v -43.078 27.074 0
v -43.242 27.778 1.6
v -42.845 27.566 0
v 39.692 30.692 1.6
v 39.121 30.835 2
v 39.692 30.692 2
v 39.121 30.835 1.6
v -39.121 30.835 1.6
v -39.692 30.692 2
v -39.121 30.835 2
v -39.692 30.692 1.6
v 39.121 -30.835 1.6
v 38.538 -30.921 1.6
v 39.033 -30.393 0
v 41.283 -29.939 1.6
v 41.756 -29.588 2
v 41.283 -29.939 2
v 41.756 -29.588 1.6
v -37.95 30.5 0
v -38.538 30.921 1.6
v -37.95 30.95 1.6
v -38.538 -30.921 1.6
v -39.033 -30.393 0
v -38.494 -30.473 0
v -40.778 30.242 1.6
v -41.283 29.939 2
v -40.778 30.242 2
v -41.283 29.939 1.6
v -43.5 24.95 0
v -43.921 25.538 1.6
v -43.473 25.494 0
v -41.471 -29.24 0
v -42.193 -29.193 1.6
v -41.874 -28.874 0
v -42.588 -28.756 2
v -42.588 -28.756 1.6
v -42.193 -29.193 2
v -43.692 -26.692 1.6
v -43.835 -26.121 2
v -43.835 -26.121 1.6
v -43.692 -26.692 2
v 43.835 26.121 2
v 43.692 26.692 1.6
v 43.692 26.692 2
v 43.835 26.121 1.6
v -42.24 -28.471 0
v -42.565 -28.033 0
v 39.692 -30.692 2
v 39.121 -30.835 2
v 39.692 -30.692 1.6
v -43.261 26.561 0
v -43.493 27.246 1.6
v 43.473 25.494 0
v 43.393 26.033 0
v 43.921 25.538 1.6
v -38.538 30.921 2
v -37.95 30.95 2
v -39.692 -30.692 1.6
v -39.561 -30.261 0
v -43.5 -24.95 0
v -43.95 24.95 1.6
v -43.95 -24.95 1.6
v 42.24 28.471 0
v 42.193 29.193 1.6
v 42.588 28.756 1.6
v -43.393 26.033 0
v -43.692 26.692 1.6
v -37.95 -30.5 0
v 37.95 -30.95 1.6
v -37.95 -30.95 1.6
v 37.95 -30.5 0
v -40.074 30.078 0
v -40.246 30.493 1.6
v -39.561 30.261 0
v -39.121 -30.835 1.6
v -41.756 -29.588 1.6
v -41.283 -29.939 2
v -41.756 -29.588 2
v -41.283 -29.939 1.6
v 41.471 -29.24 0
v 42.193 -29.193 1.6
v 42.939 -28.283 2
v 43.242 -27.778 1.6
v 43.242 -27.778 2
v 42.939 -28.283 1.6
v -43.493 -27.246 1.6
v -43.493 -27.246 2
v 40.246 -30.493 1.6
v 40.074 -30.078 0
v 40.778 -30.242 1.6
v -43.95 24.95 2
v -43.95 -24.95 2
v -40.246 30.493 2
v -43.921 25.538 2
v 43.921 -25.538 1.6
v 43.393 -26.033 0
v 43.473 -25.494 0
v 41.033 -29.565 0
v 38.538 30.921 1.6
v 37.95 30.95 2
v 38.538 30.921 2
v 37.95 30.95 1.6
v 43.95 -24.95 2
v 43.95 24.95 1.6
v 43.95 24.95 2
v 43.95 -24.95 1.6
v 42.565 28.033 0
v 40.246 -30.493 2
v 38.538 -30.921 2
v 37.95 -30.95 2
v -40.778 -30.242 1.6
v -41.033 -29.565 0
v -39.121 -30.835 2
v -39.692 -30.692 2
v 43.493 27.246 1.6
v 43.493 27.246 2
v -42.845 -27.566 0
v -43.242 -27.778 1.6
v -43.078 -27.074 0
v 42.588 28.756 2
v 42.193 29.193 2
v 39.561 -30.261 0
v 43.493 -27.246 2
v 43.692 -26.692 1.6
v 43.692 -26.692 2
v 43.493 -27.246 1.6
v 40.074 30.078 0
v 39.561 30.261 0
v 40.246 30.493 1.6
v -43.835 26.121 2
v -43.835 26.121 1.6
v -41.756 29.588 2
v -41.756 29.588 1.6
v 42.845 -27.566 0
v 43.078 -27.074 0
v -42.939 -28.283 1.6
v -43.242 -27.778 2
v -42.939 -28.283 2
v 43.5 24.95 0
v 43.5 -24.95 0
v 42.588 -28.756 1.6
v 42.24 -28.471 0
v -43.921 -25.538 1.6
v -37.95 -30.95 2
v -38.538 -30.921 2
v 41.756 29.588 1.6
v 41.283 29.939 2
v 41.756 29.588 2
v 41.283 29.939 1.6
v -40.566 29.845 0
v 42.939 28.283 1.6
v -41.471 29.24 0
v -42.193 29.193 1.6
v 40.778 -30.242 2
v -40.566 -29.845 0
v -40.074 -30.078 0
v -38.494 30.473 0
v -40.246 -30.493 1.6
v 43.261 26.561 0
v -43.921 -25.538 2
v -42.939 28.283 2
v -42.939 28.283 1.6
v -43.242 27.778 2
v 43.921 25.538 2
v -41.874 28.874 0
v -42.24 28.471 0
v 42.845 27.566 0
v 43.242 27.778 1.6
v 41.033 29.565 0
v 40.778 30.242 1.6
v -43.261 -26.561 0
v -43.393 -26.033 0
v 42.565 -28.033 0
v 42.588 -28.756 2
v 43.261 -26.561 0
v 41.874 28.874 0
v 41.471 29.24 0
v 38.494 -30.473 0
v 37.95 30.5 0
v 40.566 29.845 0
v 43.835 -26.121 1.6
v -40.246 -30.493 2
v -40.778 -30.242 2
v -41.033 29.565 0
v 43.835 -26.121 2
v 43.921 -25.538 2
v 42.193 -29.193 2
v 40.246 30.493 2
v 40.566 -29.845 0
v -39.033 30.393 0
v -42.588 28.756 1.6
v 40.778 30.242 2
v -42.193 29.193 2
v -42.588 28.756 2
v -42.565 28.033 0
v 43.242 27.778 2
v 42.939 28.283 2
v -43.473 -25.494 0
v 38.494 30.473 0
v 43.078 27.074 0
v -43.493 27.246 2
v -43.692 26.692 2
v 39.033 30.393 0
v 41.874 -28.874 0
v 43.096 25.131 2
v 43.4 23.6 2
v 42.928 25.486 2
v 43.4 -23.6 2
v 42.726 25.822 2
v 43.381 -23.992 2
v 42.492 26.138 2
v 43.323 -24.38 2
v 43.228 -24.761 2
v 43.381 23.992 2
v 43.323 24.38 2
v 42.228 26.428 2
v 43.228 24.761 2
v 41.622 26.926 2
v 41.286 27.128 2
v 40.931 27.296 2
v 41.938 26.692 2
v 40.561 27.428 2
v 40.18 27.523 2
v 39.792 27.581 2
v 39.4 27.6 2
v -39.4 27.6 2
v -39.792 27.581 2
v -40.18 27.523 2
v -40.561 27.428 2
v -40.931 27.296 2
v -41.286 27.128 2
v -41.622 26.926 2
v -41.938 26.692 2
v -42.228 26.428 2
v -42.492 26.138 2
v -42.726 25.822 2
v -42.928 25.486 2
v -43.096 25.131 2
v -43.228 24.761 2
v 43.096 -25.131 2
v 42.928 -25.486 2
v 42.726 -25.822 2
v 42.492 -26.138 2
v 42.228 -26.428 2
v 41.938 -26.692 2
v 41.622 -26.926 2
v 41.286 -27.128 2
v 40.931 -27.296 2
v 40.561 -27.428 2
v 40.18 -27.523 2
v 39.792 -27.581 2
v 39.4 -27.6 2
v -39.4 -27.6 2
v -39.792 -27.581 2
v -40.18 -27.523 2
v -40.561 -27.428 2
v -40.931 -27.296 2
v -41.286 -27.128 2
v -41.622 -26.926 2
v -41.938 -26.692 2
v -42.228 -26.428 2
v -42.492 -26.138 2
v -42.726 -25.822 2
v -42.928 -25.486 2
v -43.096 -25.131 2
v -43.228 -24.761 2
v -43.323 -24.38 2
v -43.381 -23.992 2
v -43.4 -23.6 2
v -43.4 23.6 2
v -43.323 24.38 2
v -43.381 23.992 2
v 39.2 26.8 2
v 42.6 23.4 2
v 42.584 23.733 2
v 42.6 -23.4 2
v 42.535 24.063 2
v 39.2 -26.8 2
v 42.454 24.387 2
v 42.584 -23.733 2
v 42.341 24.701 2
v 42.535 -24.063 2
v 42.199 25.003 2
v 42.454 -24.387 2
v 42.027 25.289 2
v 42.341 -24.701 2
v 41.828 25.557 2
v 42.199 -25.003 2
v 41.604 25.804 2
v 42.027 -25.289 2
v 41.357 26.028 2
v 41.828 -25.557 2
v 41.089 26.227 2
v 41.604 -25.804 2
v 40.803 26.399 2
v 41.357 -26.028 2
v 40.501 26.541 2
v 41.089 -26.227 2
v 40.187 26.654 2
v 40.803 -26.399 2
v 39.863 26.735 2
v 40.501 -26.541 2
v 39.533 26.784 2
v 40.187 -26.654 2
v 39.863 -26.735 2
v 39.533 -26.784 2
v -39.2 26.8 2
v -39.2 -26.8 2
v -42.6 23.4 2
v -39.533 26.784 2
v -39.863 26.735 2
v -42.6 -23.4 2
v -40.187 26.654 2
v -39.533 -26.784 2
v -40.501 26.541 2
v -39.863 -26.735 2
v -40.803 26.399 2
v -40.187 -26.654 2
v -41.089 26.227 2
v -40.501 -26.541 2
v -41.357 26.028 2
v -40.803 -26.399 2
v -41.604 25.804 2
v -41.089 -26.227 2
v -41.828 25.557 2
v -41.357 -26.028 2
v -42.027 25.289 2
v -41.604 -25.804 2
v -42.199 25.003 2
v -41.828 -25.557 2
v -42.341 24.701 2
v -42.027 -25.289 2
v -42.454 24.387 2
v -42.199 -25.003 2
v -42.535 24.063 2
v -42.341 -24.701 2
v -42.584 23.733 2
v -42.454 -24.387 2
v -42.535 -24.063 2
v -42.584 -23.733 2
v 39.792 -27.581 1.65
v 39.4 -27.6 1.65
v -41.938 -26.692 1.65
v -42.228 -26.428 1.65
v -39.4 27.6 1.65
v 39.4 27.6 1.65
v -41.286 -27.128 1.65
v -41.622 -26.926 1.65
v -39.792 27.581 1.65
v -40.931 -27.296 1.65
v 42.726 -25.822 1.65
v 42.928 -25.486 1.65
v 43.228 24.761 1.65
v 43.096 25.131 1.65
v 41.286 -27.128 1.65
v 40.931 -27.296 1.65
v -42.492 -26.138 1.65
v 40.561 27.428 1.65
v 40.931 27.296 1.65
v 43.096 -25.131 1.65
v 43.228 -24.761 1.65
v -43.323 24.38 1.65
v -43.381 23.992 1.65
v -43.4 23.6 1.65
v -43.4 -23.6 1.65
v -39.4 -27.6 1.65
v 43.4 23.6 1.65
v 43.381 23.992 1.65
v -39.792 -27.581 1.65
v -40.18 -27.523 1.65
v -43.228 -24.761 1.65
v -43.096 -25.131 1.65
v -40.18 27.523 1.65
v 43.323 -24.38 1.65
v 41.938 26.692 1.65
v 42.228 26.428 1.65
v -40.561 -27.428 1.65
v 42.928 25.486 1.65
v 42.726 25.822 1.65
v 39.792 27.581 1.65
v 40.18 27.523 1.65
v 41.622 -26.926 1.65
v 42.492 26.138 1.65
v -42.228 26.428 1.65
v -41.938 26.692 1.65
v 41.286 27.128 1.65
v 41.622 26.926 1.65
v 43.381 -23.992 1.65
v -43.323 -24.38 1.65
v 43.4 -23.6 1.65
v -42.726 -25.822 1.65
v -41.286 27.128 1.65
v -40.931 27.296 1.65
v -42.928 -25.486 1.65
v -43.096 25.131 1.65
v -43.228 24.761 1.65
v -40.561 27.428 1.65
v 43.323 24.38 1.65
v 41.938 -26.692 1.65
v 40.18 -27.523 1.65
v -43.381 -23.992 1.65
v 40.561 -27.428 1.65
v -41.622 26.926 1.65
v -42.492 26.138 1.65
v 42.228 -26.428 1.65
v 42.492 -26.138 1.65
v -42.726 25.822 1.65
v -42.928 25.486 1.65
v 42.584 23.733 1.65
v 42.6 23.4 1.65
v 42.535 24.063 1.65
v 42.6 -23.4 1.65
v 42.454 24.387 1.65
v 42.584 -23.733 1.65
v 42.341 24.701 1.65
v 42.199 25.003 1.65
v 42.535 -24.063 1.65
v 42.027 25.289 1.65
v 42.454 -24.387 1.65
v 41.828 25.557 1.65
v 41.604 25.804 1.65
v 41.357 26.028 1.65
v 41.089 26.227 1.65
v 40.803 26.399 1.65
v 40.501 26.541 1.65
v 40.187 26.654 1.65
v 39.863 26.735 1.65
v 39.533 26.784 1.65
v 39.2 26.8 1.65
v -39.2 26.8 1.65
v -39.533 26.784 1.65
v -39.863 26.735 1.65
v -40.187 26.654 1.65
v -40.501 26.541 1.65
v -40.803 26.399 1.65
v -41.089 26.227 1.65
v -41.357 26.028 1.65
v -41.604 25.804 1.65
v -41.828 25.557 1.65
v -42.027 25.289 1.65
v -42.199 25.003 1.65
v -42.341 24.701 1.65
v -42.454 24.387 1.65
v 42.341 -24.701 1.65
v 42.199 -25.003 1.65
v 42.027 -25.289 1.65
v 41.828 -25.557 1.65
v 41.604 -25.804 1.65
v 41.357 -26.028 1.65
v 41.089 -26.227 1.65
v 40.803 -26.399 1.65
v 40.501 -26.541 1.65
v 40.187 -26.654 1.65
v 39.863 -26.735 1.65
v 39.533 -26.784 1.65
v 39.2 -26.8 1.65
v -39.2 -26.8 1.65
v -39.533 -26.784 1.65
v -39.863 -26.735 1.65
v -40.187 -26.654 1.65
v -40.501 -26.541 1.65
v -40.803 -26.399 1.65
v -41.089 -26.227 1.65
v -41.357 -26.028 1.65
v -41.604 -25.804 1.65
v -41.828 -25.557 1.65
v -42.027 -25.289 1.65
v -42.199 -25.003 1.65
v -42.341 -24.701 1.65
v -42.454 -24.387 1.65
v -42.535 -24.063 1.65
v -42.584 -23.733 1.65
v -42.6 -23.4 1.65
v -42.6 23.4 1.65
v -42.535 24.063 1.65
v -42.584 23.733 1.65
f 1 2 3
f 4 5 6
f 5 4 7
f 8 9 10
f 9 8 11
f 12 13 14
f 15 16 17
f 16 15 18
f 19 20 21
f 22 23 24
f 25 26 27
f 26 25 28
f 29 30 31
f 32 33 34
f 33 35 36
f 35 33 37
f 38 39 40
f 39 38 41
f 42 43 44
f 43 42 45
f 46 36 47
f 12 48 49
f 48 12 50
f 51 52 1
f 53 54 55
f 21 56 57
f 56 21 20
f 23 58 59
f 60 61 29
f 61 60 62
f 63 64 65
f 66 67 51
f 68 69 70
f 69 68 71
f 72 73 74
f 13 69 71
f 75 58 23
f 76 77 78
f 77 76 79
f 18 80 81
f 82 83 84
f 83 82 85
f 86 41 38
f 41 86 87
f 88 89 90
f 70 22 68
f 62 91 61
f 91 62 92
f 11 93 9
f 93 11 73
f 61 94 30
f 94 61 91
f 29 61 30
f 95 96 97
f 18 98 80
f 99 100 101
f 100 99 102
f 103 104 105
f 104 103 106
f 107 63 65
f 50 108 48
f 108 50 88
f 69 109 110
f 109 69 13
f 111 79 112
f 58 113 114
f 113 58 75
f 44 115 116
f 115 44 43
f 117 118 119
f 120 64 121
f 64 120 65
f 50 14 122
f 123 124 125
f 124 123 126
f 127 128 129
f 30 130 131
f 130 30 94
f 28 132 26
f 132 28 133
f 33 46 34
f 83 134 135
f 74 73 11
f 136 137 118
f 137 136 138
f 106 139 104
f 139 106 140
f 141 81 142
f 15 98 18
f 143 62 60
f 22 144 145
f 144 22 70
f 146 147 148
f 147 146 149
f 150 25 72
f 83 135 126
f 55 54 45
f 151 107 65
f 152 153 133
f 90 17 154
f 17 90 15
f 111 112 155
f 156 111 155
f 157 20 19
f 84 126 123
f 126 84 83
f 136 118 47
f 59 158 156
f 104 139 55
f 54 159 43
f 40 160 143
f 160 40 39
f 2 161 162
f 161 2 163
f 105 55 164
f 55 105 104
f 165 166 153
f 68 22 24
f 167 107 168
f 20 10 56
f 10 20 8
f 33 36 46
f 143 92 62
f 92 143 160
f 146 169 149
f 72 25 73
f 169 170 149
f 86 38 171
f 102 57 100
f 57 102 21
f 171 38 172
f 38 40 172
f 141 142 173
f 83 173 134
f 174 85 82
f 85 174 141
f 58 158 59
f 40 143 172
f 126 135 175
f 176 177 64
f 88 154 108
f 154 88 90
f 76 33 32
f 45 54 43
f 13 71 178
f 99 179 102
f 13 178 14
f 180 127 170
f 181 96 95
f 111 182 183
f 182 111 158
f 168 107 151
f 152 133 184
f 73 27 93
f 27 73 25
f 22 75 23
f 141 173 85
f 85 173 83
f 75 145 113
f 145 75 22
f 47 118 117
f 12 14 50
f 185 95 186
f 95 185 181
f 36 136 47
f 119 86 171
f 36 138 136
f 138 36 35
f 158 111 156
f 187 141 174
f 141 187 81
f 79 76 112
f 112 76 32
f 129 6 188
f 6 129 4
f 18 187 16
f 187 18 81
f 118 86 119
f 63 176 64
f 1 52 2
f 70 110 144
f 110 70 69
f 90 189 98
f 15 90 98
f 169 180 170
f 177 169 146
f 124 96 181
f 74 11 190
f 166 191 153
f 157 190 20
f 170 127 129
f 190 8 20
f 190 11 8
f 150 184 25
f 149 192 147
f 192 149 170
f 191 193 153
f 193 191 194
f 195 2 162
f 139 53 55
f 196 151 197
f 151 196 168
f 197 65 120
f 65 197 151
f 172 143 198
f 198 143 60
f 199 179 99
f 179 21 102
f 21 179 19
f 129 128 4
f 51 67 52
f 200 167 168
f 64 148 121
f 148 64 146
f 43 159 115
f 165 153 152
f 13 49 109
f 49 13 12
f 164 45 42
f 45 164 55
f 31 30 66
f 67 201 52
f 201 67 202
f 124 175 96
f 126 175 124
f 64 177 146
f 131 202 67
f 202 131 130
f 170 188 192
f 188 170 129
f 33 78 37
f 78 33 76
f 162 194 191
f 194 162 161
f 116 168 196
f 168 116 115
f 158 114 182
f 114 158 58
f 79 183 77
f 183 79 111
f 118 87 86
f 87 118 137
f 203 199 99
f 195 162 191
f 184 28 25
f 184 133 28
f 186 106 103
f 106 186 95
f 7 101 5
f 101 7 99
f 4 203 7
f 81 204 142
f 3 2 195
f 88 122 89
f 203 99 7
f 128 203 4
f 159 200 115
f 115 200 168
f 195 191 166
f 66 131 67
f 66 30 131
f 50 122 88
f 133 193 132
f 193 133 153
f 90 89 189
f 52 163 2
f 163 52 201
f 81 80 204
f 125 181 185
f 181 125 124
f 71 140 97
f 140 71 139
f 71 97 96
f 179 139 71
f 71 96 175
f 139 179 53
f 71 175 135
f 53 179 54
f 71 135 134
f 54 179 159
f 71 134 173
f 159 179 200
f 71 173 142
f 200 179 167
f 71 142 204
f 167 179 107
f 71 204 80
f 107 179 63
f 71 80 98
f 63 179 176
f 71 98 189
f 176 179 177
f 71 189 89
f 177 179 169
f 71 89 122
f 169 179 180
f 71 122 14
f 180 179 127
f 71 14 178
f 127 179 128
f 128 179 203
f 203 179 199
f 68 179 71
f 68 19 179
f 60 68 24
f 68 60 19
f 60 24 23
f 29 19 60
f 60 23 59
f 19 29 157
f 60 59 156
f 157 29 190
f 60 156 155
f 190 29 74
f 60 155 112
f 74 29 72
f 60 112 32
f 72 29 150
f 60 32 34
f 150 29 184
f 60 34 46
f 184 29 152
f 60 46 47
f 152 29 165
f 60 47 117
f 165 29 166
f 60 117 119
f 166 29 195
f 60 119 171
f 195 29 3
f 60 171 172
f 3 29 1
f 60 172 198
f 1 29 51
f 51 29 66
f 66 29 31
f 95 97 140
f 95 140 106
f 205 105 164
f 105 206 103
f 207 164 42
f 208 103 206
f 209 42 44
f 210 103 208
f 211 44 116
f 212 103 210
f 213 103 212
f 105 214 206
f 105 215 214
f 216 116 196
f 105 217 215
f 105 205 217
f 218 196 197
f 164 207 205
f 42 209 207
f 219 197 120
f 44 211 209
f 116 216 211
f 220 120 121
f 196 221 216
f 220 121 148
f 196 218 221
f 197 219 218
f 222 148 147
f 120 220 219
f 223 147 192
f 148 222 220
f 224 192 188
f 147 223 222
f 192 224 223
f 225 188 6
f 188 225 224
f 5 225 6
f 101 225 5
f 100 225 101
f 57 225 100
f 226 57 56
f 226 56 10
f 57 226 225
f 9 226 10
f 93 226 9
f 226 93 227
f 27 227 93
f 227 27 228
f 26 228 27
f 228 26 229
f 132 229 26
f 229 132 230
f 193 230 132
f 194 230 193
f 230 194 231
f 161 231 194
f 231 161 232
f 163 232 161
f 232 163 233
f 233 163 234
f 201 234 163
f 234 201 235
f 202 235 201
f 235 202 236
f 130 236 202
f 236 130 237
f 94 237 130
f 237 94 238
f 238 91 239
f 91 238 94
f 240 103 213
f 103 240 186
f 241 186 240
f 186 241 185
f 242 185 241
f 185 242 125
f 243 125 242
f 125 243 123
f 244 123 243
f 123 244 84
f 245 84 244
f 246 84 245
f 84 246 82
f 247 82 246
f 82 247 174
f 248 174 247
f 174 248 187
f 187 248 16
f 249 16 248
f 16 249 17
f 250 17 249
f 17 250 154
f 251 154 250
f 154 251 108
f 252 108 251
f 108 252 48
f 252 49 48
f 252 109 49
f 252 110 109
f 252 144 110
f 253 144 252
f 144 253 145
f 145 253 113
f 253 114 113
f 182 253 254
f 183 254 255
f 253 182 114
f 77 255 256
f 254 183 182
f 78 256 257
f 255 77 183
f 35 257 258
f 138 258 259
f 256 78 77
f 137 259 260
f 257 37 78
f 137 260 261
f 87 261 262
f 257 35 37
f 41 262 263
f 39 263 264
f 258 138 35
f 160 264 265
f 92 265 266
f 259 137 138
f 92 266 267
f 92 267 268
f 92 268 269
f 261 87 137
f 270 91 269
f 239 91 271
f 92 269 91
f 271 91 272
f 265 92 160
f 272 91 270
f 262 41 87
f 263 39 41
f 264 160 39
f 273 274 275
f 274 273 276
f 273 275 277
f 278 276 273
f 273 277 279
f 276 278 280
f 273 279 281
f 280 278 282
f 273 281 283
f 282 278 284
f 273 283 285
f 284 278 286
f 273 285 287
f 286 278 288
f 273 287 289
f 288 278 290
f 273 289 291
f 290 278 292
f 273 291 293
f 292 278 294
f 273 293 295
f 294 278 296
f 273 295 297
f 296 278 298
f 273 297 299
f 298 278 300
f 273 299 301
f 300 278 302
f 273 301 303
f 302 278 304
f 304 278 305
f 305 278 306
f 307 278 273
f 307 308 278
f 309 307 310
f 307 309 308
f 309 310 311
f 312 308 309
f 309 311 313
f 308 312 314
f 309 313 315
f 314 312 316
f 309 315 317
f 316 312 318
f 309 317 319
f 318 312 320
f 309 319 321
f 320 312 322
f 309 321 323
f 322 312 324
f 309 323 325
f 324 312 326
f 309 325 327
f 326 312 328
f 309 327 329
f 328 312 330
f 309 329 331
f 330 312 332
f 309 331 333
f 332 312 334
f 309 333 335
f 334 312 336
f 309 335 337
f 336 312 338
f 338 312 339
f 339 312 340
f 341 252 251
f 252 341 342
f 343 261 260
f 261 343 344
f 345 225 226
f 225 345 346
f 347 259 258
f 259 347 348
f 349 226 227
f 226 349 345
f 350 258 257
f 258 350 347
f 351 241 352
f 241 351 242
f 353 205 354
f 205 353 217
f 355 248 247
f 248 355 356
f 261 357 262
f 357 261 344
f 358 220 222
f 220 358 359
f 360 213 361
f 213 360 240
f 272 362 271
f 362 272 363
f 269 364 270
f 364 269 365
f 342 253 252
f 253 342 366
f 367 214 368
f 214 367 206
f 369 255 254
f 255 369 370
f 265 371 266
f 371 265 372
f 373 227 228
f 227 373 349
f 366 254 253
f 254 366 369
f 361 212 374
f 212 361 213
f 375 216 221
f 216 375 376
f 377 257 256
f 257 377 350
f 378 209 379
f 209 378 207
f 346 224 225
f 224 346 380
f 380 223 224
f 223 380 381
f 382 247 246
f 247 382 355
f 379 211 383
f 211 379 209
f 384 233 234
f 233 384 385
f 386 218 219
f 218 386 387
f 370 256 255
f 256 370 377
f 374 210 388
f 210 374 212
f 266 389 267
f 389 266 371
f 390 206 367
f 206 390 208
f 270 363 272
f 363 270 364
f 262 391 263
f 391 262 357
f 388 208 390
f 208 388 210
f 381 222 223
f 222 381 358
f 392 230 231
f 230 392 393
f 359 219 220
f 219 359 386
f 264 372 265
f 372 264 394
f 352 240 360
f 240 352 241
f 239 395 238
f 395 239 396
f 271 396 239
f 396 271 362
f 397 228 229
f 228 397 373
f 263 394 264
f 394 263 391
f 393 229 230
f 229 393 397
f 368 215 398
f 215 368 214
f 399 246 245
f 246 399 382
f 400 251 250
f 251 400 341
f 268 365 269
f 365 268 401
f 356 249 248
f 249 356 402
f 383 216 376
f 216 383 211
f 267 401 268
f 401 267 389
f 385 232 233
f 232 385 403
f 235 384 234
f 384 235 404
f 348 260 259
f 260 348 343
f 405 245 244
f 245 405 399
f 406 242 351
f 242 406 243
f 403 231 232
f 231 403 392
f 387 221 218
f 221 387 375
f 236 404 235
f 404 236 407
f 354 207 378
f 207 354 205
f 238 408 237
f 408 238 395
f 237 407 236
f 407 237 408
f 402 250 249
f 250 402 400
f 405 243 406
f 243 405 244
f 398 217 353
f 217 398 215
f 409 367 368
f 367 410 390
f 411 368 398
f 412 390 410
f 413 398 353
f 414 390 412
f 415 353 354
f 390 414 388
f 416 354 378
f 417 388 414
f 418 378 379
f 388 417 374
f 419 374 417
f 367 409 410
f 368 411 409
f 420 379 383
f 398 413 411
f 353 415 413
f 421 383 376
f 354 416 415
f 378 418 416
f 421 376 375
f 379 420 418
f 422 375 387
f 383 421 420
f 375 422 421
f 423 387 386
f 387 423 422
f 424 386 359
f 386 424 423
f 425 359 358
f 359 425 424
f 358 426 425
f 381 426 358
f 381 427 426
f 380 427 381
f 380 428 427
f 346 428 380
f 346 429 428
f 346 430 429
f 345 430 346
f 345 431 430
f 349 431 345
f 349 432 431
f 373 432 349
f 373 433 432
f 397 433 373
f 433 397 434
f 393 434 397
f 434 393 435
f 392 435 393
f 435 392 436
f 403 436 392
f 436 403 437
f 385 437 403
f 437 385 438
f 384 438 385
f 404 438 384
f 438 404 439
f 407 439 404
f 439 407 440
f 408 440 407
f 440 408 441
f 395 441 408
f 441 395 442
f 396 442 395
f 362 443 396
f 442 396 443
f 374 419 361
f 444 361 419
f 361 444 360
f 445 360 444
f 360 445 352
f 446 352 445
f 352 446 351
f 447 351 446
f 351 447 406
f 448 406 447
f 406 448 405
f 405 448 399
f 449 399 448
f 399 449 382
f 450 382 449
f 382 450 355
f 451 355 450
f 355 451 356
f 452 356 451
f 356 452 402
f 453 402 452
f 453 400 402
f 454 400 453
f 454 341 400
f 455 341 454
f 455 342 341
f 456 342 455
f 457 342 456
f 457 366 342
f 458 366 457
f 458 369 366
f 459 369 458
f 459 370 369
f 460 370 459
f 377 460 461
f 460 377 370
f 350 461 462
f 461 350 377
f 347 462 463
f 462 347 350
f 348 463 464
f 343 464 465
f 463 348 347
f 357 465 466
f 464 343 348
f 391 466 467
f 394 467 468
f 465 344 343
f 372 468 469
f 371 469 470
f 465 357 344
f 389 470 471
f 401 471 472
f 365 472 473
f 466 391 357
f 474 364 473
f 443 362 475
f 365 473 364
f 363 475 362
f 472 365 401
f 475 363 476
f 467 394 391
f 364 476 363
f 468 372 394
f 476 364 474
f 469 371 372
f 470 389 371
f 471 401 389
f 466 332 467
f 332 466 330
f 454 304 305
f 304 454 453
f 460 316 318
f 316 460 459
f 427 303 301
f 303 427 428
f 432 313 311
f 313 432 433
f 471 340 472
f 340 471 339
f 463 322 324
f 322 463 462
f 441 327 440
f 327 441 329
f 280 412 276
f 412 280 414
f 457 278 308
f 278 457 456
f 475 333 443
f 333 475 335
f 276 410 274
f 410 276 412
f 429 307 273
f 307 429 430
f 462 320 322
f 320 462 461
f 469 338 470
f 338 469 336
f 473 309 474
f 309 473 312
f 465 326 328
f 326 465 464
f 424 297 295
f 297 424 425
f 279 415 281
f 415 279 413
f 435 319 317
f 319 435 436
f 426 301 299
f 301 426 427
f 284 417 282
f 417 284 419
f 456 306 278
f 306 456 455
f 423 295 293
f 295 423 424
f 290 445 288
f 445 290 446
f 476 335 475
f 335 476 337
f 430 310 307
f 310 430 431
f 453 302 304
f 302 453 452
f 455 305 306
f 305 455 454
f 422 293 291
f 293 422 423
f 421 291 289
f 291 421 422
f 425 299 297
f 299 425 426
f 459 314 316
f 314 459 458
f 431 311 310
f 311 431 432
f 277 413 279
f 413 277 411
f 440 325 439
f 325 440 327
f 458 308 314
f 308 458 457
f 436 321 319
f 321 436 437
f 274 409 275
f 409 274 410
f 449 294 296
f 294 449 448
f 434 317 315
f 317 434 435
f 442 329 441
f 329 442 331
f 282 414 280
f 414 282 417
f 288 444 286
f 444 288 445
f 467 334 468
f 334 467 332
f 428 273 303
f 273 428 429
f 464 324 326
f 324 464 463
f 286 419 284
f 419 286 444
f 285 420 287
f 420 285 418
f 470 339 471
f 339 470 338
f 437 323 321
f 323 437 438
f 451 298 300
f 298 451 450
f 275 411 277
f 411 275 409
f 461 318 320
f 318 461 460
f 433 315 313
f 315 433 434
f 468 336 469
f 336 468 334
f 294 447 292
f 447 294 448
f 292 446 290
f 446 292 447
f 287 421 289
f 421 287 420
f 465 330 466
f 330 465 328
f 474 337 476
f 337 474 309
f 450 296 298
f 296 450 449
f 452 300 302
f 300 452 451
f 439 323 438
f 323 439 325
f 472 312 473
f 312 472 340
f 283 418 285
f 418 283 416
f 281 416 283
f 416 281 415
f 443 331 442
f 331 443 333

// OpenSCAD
// file: ../../sorgenti/libreria.scad
// ============================================================
// libreria.scad — forme di base riusate da tutti i pezzi
// ============================================================
include <parametri.scad>

$fn = RISOLUZIONE;

// Prisma a sezione rettangolare con angoli arrotondati.
module piastra(x, y, h, r) {
    linear_extrude(height = h)
        offset(r = r) square([x - 2*r, y - 2*r], center = true);
}

// Scatola piena con angoli verticali arrotondati (rv) e bordo
// superiore raccordato (rt). Il raccordo è approssimato a gradini
// uniti con hull(): resta liscio e si stampa senza supporti.
module scatola_arrotondata(x, y, z, rv, rt, passi = 12) {
    union() {
        piastra(x, y, z - rt, rv);
        for (i = [0 : passi - 1]) {
            a0 = 90 * i / passi;
            a1 = 90 * (i + 1) / passi;
            k0 = rt * (1 - cos(a0));  k1 = rt * (1 - cos(a1));
            h0 = rt * sin(a0);        h1 = rt * sin(a1);
            hull() {
                translate([0, 0, z - rt + h0])
                    piastra(x - 2*k0, y - 2*k0, 0.02, max(rv - k0, 0.6));
                translate([0, 0, z - rt + h1])
                    piastra(x - 2*k1, y - 2*k1, 0.02, max(rv - k1, 0.6));
            }
        }
    }
}

// Foro di passaggio per vite con svasatura della testa (testa in basso,
// si avvita dal basso verso l'alto).
module foro_svasato(h = 10, d = VITE_FORO, testa_d = VITE_TESTA_D, testa_h = 1.6) {
    translate([0, 0, -0.1]) cylinder(h = h + 0.2, d = d);
    translate([0, 0, -0.1]) cylinder(h = testa_h + 0.1, d1 = testa_d, d2 = d);
}

// Pilastrino con sede per inserto a caldo M2,5 (si inserisce dal basso).
module boss_inserto(h = 12, d = BOSS_D) {
    difference() {
        cylinder(h = h, d = d);
        translate([0, 0, -0.1]) cylinder(h = INSERTO_H + 0.1, d = INSERTO_D);
        // scarico sopra l'inserto, per la punta della vite
        translate([0, 0, INSERTO_H]) cylinder(h = h, d = VITE_D + 0.4);
    }
}

// Griglia di fori a nido d'ape dentro un cerchio di diametro d_area.
module griglia_tonda(d_area, spessore, d_foro = ALT_GRIGLIA_D, passo = 3.2) {
    n = ceil(d_area / passo) + 2;
    for (i = [-n : n], j = [-n : n]) {
        x = i * passo + (abs(j) % 2) * passo / 2;
        y = j * passo * 0.866;
        if (sqrt(x*x + y*y) <= (d_area - d_foro) / 2)
            translate([x, y, -0.1]) cylinder(h = spessore + 0.2, d = d_foro);
    }
}

// Fessura allungata (slot) con estremi arrotondati, asse X.
module fessura(lung, larg, h) {
    hull() {
        translate([-(lung - larg)/2, 0, 0]) cylinder(h = h, d = larg);
        translate([ (lung - larg)/2, 0, 0]) cylinder(h = h, d = larg);
    }
}

// Scritta in rilievo (per i provini e le etichette).
module scritta(t, dim = 6, alt = 0.6) {
    linear_extrude(height = alt)
        text(t, size = dim, halign = "center", valign = "center",
             font = "Helvetica:style=Bold");
}

// Freccia piena, punta verso +X, usata per le icone dei tasti.
module freccia(lung = 16, larg = 14, alt = 0.8) {
    gambo = larg / 5;          // mezza larghezza del gambo
    testa = lung * 0.45;       // lunghezza della punta
    linear_extrude(height = alt)
        polygon([[-lung/2, -gambo], [lung/2 - testa, -gambo],
                 [lung/2 - testa, -larg/2], [lung/2, 0],
                 [lung/2 - testa, larg/2], [lung/2 - testa, gambo],
                 [-lung/2, gambo]]);
}

// Icona "volume": tre barrette crescenti, asse X.
module icona_volume(n = 3, alt = 0.8, passo = 3.2, base = 2.0, cresc = 1.6) {
    for (i = [0 : n - 1])
        translate([i * passo, 0, 0])
            linear_extrude(height = alt)
                square([1.8, base + i * cresc], center = true);
}

// Cava a sezione rettangolare arrotondata, asse di estrusione Y.
// Utile per finestre e fessure nelle pareti verticali.
module cava_y(x, z, prof, r = 1.5) {
    rotate([90, 0, 0])
        linear_extrude(height = prof, center = true)
            offset(r = r) square([x - 2*r, z - 2*r], center = true);
}

// Pilastrino che parte dal piano del fondo e ospita un inserto a caldo
// (inserito dal basso). La punta conica in alto lo rende stampabile
// anche a scatola capovolta.
module boss_fondo(h = 12) {
    union() {
        difference() {
            cylinder(h = h, d = BOSS_D);
            translate([0, 0, -0.1]) cylinder(h = INSERTO_H + 0.1, d = INSERTO_D);
            translate([0, 0, INSERTO_H]) cylinder(h = h, d = VITE_D + 0.6);
        }
        translate([0, 0, h]) cylinder(h = BOSS_D/2, d1 = BOSS_D, d2 = 0.4);
    }
}

// Pilastrino appeso al soffitto (coperchio): l'inserto entra dal basso.
module boss_soffitto(h = 7) {
    difference() {
        translate([0, 0, -h]) cylinder(h = h, d = BOSS_D);
        translate([0, 0, -h - 0.1]) cylinder(h = INSERTO_H + 0.1, d = INSERTO_D);
    }
}

// Maschio della coda di rondine: si infila nella cava della fiancata.
// Si stampa in verticale insieme al raccoglitore, quindi senza supporti.
module coda_maschio(altezza) {
    gioco = 0.35;
    rotate([-90, 0, 0])
        linear_extrude(height = altezza)
            polygon([[0, -(CODA_FONDO - gioco)/2], [0, (CODA_FONDO - gioco)/2],
                     [CODA_PROF - 0.3, (CODA_BOCCA - gioco)/2],
                     [CODA_PROF - 0.3, -(CODA_BOCCA - gioco)/2]]);
}
// main file
// ============================================================
// piatto-nfc.scad — fondo del vassoio di appoggio
// ------------------------------------------------------------
// È la superficie su cui si appoggiano le carte delle storie e i
// dischi della musica, e l'unico diaframma fra tag e antenna: 2 mm.
// Entra dal basso e si incastra (il foro si restringe), poi si
// incolla. Il PN5180 va fissato con biadesivo sotto, centrato.
//
// STAMPA: appoggiato, faccia a vista sul piano. Bello in un colore
// diverso dalla scocca: è la parte che si guarda di più.
// ============================================================
include <../../sorgenti/libreria.scad>

piatto_nfc();

module piatto_nfc() {
    h = TOP_SP - NFC_PROF;                        // 2,0 mm
    lx_basso = NFC_X_LUNG + GIOCO_FORO - 0.9 - GIOCO;
    ly_basso = NFC_Y_LARG + GIOCO_FORO - 0.9 - GIOCO;
    lx_alto  = NFC_X_LUNG + GIOCO_FORO - GIOCO;
    ly_alto  = NFC_Y_LARG + GIOCO_FORO - GIOCO;

    difference() {
        union() {
            // tronco di piramide: si incastra nel foro che si restringe
            hull() {
                piastra(lx_basso, ly_basso, 0.02, NFC_RAGGIO - 0.45);
                translate([0, 0, h - 0.4])
                    piastra(lx_alto, ly_alto, 0.02, NFC_RAGGIO);
            }
            // ultimo scalino, a filo del fondo del vassoio
            translate([0, 0, h - 0.4])
                piastra(lx_alto, ly_alto, 0.4, NFC_RAGGIO);
        }
        // segno leggero che dice dove appoggiare: il contorno di una carta
        translate([0, 0, h - 0.35])
            difference() {
                piastra(CARTA_X + 1.2, CARTA_Y + 1.2, 0.45, 4);
                translate([0, 0, -0.1])
                    piastra(CARTA_X - 0.4, CARTA_Y - 0.4, 0.65, 3.4);
            }
    }
}
